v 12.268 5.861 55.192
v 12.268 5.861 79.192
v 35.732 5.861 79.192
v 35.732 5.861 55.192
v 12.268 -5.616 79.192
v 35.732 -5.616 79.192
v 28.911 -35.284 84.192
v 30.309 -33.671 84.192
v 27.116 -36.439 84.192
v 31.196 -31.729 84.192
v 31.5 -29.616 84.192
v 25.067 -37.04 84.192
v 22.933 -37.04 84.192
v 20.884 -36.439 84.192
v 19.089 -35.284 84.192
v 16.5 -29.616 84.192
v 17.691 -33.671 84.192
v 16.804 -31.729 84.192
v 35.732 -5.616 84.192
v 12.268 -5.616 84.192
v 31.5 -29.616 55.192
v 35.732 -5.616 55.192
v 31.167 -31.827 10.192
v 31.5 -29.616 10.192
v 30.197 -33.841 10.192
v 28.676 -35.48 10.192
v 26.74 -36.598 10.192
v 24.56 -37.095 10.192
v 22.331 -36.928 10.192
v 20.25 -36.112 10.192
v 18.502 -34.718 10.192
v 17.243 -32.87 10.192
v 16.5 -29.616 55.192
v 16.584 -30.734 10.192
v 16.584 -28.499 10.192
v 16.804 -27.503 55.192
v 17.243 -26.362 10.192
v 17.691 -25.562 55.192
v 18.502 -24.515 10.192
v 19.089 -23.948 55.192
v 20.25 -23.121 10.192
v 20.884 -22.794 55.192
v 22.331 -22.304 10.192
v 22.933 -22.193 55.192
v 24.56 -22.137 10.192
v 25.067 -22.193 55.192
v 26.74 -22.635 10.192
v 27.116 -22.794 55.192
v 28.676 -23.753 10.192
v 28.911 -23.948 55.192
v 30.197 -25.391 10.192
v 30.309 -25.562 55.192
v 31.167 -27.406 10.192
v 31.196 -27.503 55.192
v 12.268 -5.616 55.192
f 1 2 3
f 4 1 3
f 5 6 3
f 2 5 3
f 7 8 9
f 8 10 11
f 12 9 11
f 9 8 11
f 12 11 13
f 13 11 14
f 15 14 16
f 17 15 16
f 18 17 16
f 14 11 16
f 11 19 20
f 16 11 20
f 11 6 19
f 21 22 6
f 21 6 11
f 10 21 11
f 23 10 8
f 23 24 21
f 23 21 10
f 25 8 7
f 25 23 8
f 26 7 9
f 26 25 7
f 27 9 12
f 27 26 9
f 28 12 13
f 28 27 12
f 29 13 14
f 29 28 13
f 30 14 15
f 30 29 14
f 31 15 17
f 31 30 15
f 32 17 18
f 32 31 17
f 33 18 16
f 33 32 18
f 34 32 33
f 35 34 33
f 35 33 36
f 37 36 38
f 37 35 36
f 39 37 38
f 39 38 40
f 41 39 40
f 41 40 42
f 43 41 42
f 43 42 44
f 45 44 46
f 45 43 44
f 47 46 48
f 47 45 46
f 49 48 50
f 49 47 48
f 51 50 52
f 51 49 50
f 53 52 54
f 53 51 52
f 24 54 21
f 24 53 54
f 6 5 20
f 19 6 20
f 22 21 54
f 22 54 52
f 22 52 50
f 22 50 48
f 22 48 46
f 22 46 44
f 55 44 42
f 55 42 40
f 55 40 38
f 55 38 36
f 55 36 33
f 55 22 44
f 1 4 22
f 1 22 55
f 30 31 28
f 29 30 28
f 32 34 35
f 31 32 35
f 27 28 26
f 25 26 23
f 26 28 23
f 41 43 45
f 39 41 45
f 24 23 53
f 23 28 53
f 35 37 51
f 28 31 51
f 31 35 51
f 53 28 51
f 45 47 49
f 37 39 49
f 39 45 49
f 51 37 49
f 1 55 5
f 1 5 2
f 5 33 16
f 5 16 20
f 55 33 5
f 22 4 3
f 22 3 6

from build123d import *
from build123d.topology import SkipClean

# Parameters (mm, degrees)
SKETCH1_W               = 48
SKETCH1_H               = 53
BOSS_EXTRUDE1_DEPTH     = 10
SKETCH2_W               = 48
SKETCH2_H               = 5.616325
BOSS_EXTRUDE2_DEPTH     = 33.1917878
SKETCH4_W               = 4
SKETCH4_H               = 10
BOSS_EXTRUDE4_DEPTH     = 40
SKETCH5_W               = 48
SKETCH5_H               = 10.8609375
BOSS_EXTRUDE5_DEPTH     = 23.1917878
SKETCH6_W               = 48
SKETCH6_H               = 5
BOSS_EXTRUDE6_DEPTH     = 42.3
SKETCH7_W               = 12.8082122
SKETCH7_H               = 16.4772625
BOSS_EXTRUDE7_DEPTH     = 48
CUT_EXTRUDE1_REACH      = 84.426
SKETCH8_R               = 11.5
SKETCH8_R_2             = 2
FILLET1_R               = 10
FILLET2_R               = 4
SKETCH9_W               = 5
SKETCH9_H               = 16.4772625
BOSS_EXTRUDE9_DEPTH     = 48
CUT_EXTRUDE2_DEPTH      = 88.252507127
SKETCH11_W              = 51
SKETCH11_H              = 16.4772625
BOSS_EXTRUDE10_DEPTH    = 49.45
BOSS_EXTRUDE11_DEPTH    = 46
SKETCH16_W              = 47.95
SKETCH16_H              = 51
BOSS_EXTRUDE14_DEPTH    = 2.55
SKETCH14_W              = 5
SKETCH14_H              = 42.3
BOSS_EXTRUDE13_DEPTH    = 1.5
SKETCH17_W              = 51
SKETCH17_H              = 19.0272625
BOSS_EXTRUDE15_DEPTH    = 9
BOSS_EXTRUDE16_DEPTH    = 25
SKETCH19_R              = 1.9304
CUT_EXTRUDE3_DEPTH      = 125.404890183
MIRROR2_START           = 33.1917878
MIRROR2_DEPTH           = 51
MIRROR2_START_2         = 76.1917878
MIRROR2_2_OUTLINE_W     = 47.95
MIRROR2_2_OUTLINE_H     = 25
MIRROR2_2_OUTLINE_R     = 1.9304
MIRROR2_2_DEPTH         = 8
MIRROR2_3_OUTLINE_W     = 45
MIRROR2_3_OUTLINE_H     = 42.3
MIRROR2_3_OUTLINE_R     = 2
MIRROR2_3_OUTLINE_R_2   = 11.5
MIRROR2_3_DEPTH         = 5
SKETCH20_W              = 103.287975037
SKETCH20_H              = 97.84889924
CUT_EXTRUDE4_DEPTH      = 144.929961559
SKETCH21_W              = 49.5
SKETCH21_H              = 42.3
CUT_EXTRUDE5_DEPTH      = 128.391431036
SKETCH24_R              = 7.5
BOSS_EXTRUDE18_DEPTH    = 45
BOSS_EXTRUDE19_DEPTH    = 29
SKETCH26_R              = 3.937
CUT_EXTRUDE6_DEPTH      = 135.023808387
CUT_EXTRUDE7_DEPTH      = 133.174975247
CUT_EXTRUDE7_DEPTH_BACK = 133.174975247
SKETCH27_W              = 131.04651434
SKETCH27_H              = 69.942394415
SKETCH30_W              = 22
SKETCH30_H              = 11.4772625
SKETCH30_W_2            = 5
CUT_EXTRUDE10_DEPTH     = 95.954850856


# Read off the part's stored shape, not the designer's step: Mirror2
with BuildPart() as part:
    # Sketch1 → Boss-Extrude1 (new body)
    with BuildSketch(Plane.XY):
        with Locations((24, 26.5)):
            Rectangle(SKETCH1_W, SKETCH1_H)
    extrude(amount=BOSS_EXTRUDE1_DEPTH)

    # Sketch2 → Boss-Extrude2 (add)
    with BuildSketch(Plane(origin=(0, 0, 0), x_dir=(-1, 0, 0), z_dir=(0, 0, -1))):
        with Locations((-24, -2.8081625)):
            Rectangle(SKETCH2_W, SKETCH2_H)
    extrude(amount=-BOSS_EXTRUDE2_DEPTH)

    # Sketch4 → Boss-Extrude4 (add)
    with BuildSketch(Plane.XY.offset(10)):
        with Locations((2, 48)):
            Rectangle(SKETCH4_W, SKETCH4_H)
        with Locations((46, 48)):
            Rectangle(SKETCH4_W, SKETCH4_H)
    extrude(amount=BOSS_EXTRUDE4_DEPTH)

    # Sketch5 → Boss-Extrude5 (add)
    with BuildSketch(Plane.XY.offset(10)):
        with Locations((24, 5.43046875)):
            Rectangle(SKETCH5_W, SKETCH5_H)
    extrude(amount=BOSS_EXTRUDE5_DEPTH)

    # Sketch6 → Boss-Extrude6 (add)
    with BuildSketch(Plane.XZ.offset(5.616325)):
        with Locations((24, 30.6917878)):
            Rectangle(SKETCH6_W, SKETCH6_H)
    extrude(amount=BOSS_EXTRUDE6_DEPTH)

    # Sketch7 → Boss-Extrude7 (add)
    with BuildSketch(Plane.ZY):
        with Locations((-6.4041061, 2.62230625)):
            Rectangle(SKETCH7_W, SKETCH7_H)
    extrude(amount=-BOSS_EXTRUDE7_DEPTH)

    # Sketch8 → Cut-Extrude1 (cut, up to next)
    with BuildSketch(Plane(origin=(0, 0, 28.1917878), x_dir=(-1, 0, 0), z_dir=(0, 0, -1)), mode=Mode.PRIVATE) as cut_extrude1_sk1:
        with Locations((-24, -26.616325)):
            Circle(SKETCH8_R)
    cut_extrude1_tool1 = extrude(cut_extrude1_sk1.sketch, amount=-CUT_EXTRUDE1_REACH, mode=Mode.PRIVATE) & part.part
    # Sketch8 → Cut-Extrude1 (cut, up to next)
    with BuildSketch(Plane(origin=(0, 0, 28.1917878), x_dir=(-1, 0, 0), z_dir=(0, 0, -1)), mode=Mode.PRIVATE) as cut_extrude1_sk2:
        with Locations((-39.5, -11.116325)):
            Circle(SKETCH8_R_2)
    cut_extrude1_tool2 = extrude(cut_extrude1_sk2.sketch, amount=-CUT_EXTRUDE1_REACH, mode=Mode.PRIVATE) & part.part
    # Sketch8 → Cut-Extrude1 (cut, up to next)
    with BuildSketch(Plane(origin=(0, 0, 28.1917878), x_dir=(-1, 0, 0), z_dir=(0, 0, -1)), mode=Mode.PRIVATE) as cut_extrude1_sk3:
        with Locations((-39.5, -42.116325)):
            Circle(SKETCH8_R_2)
    cut_extrude1_tool3 = extrude(cut_extrude1_sk3.sketch, amount=-CUT_EXTRUDE1_REACH, mode=Mode.PRIVATE) & part.part
    # Sketch8 → Cut-Extrude1 (cut, up to next)
    with BuildSketch(Plane(origin=(0, 0, 28.1917878), x_dir=(-1, 0, 0), z_dir=(0, 0, -1)), mode=Mode.PRIVATE) as cut_extrude1_sk4:
        with Locations((-8.5, -11.116325)):
            Circle(SKETCH8_R_2)
    cut_extrude1_tool4 = extrude(cut_extrude1_sk4.sketch, amount=-CUT_EXTRUDE1_REACH, mode=Mode.PRIVATE) & part.part
    # Sketch8 → Cut-Extrude1 (cut, up to next)
    with BuildSketch(Plane(origin=(0, 0, 28.1917878), x_dir=(-1, 0, 0), z_dir=(0, 0, -1)), mode=Mode.PRIVATE) as cut_extrude1_sk5:
        with Locations((-8.5, -42.116325)):
            Circle(SKETCH8_R_2)
    cut_extrude1_tool5 = extrude(cut_extrude1_sk5.sketch, amount=-CUT_EXTRUDE1_REACH, mode=Mode.PRIVATE) & part.part
    add(cut_extrude1_tool1.solids().sort_by_distance((24, -26.616325, 28.191788))[0], mode=Mode.SUBTRACT)
    add(cut_extrude1_tool2.solids().sort_by_distance((39.5, -11.116325, 28.191788))[0], mode=Mode.SUBTRACT)
    add(cut_extrude1_tool3.solids().sort_by_distance((39.5, -42.116325, 28.191788))[0], mode=Mode.SUBTRACT)
    add(cut_extrude1_tool4.solids().sort_by_distance((8.5, -11.116325, 28.191788))[0], mode=Mode.SUBTRACT)
    add(cut_extrude1_tool5.solids().sort_by_distance((8.5, -42.116325, 28.191788))[0], mode=Mode.SUBTRACT)

    # Fillet1
    fillet1_edges = [part.edges().sort_by_distance(p)[0] for p in [
        (24, 10.8609375, 0),
    ]]
    fillet(fillet1_edges, radius=FILLET1_R)

    # Fillet2
    fillet2_edges = [part.edges().sort_by_distance(p)[0] for p in [
        (2, 43, 10),
        (46, 43, 10),
    ]]
    fillet(fillet2_edges, radius=FILLET2_R)

    # Sketch9 → Boss-Extrude9 (add)
    with BuildSketch(Plane(origin=(48, 0, 0), x_dir=(0, 0, -1), z_dir=(1, 0, 0))):
        with Locations((15.3082122, 2.62230625)):
            Rectangle(SKETCH9_W, SKETCH9_H)
    extrude(amount=-BOSS_EXTRUDE9_DEPTH)

    # Sketch10 → Cut-Extrude2 (cut, through all)
    with BuildSketch(Plane(origin=(48, 0, 0), x_dir=(0, 0, -1), z_dir=(1, 0, 0))):
        Polygon((17.8082122, 10.8609375), (-33.1917878, 10.8609375), (-76.887145623, 43.902095521), (-50.794096938, 74.436514195), (27.207463492, 71.105486703), align=None)
    extrude(amount=-CUT_EXTRUDE2_DEPTH, mode=Mode.SUBTRACT)

    # Sketch11 → Boss-Extrude10 (add)
    with BuildSketch(Plane(origin=(48, 0, 0), x_dir=(0, 0, -1), z_dir=(1, 0, 0))):
        with Locations((-7.6917878, 2.62230625)):
            Rectangle(SKETCH11_W, SKETCH11_H)
    extrude(amount=BOSS_EXTRUDE10_DEPTH)

    # Sketch12 → Boss-Extrude11 (add)
    with BuildSketch(Plane(origin=(0, 0, 28.1917878), x_dir=(-1, 0, 0), z_dir=(0, 0, -1))):
        Polygon((-48, -47.916325), (-45, -47.916325), (-45, -5.616325), (-49.5, -5.616325), (-49.5, -47.916325), align=None)
    extrude(amount=BOSS_EXTRUDE11_DEPTH)

    # Sketch16 → Boss-Extrude14 (add)
    with BuildSketch(Plane.XZ.offset(5.616325)):
        with Locations((73.475, 7.6917878)):
            Rectangle(SKETCH16_W, SKETCH16_H)
    extrude(amount=BOSS_EXTRUDE14_DEPTH)

    # Sketch14 → Boss-Extrude13 (add)
    with BuildSketch(Plane(origin=(49.5, 0, 0), x_dir=(0, 0, -1), z_dir=(1, 0, 0))):
        with Locations((-30.6917878, -26.766325)):
            Rectangle(SKETCH14_W, SKETCH14_H)
    extrude(amount=-BOSS_EXTRUDE13_DEPTH)

    # Sketch17 → Boss-Extrude15 (add)
    with BuildSketch(Plane(origin=(97.45, 0, 0), x_dir=(0, 0, -1), z_dir=(1, 0, 0))):
        with Locations((-7.6917878, 1.34730625)):
            Rectangle(SKETCH17_W, SKETCH17_H)
    extrude(amount=BOSS_EXTRUDE15_DEPTH)

    # Sketch18 → Boss-Extrude16 (add)
    with BuildSketch(Plane.XZ.offset(8.166325)):
        Polygon((49.5, -17.8082122), (106.45, -17.8082122), (106.45, -9.8082122), (106.45, 33.1917878), (97.45, 33.1917878), (97.45, -9.8082122), (49.5, -9.8082122), align=None)
    extrude(amount=BOSS_EXTRUDE16_DEPTH)

    # Sketch19 → Cut-Extrude3 (cut, through all)
    with BuildSketch(Plane.XY.offset(-9.8082122)):
        with Locations((58.475, -26.166325)):
            Circle(SKETCH19_R)
        with Locations((88.475, -26.166325)):
            Circle(SKETCH19_R)
    extrude(amount=-CUT_EXTRUDE3_DEPTH, mode=Mode.SUBTRACT)

    # Mirror2 outline → Mirror2 (add)
    with BuildSketch(Plane.XY.offset(MIRROR2_START)):
        Polygon((49.5, -47.916325), (49.5, -8.166325), (97.45, -8.166325), (97.45, -33.166325), (106.45, -33.166325), (106.45, 10.8609375), (0, 10.8609375), (0, -5.616325), (45, -5.616325), (45, -47.916325), align=None)
    extrude(amount=MIRROR2_DEPTH)

    # Mirror2 2 outline → Mirror2 2 (add)
    with BuildSketch(Plane.XY.offset(MIRROR2_START_2)):
        with Locations((73.475, -20.666325)):
            Rectangle(MIRROR2_2_OUTLINE_W, MIRROR2_2_OUTLINE_H)
        with Locations((58.475, -26.166325)):
            Circle(MIRROR2_2_OUTLINE_R, mode=Mode.SUBTRACT)
        with Locations((88.475, -26.166325)):
            Circle(MIRROR2_2_OUTLINE_R, mode=Mode.SUBTRACT)
    extrude(amount=MIRROR2_2_DEPTH)

    # Mirror2 3 outline → Mirror2 3 (add)
    with SkipClean():  # the faces are left unmerged after this step: merging them gives an invalid solid
        with BuildSketch(Plane.XY.offset(MIRROR2_START)):
            with Locations((22.5, -26.766325)):
                Rectangle(MIRROR2_3_OUTLINE_W, MIRROR2_3_OUTLINE_H)
            with Locations((8.5, -42.116325)):
                Circle(MIRROR2_3_OUTLINE_R, mode=Mode.SUBTRACT)
            with Locations((39.5, -42.116325)):
                Circle(MIRROR2_3_OUTLINE_R, mode=Mode.SUBTRACT)
            with Locations((24, -26.616325)):
                Circle(MIRROR2_3_OUTLINE_R_2, mode=Mode.SUBTRACT)
            with Locations((8.5, -11.116325)):
                Circle(MIRROR2_3_OUTLINE_R, mode=Mode.SUBTRACT)
            with Locations((39.5, -11.116325)):
                Circle(MIRROR2_3_OUTLINE_R, mode=Mode.SUBTRACT)
        extrude(amount=MIRROR2_3_DEPTH)

    # Sketch20 → Cut-Extrude4 (cut, through all)
    with BuildSketch(Plane.ZY):
        with Locations((-18.452199719, -38.06351212)):
            Rectangle(SKETCH20_W, SKETCH20_H)
    extrude(amount=-CUT_EXTRUDE4_DEPTH, mode=Mode.SUBTRACT)

    # Sketch21 → Cut-Extrude5 (cut, through all)
    with BuildSketch(Plane.XY.offset(84.1917878)):
        with Locations((24.75, -26.766325)):
            Rectangle(SKETCH21_W, SKETCH21_H)
    extrude(amount=-CUT_EXTRUDE5_DEPTH, mode=Mode.SUBTRACT)



with BuildPart() as body_2:
    # Sketch24 → Boss-Extrude18 (new body)
    with BuildSketch(Plane.XY.offset(55.1917878)):
        with Locations((24, -29.616325)):
            Circle(SKETCH24_R)
    extrude(amount=-BOSS_EXTRUDE18_DEPTH)


with BuildPart() as part_1:
    add(part.part)

    add(body_2.part)  # Boss-Extrude19 merges body 2
    # Sketch25 → Boss-Extrude19 (add)
    with BuildSketch(Plane.XY.offset(55.1917878)):
        with BuildLine():
            Line((16.5, -29.616325), (12.268152463, -5.616325))
            Line((12.268152463, -5.616325), (35.731847537, -5.616325))
            Line((35.731847537, -5.616325), (31.5, -29.616325))
            ThreePointArc((31.5, -29.616325), (24, -37.116325), (16.5, -29.616325))
        make_face()
    extrude(amount=BOSS_EXTRUDE19_DEPTH)

    # Sketch26 → Cut-Extrude6 (cut, through all)
    with BuildSketch(Plane.ZY.offset(-97.45)):
        with Locations((59.1917878, -16.166325)):
            Circle(SKETCH26_R)
    extrude(amount=-CUT_EXTRUDE6_DEPTH, mode=Mode.SUBTRACT)

    # Sketch27 → Cut-Extrude7 (cut, two sides: drawn at the far end of the back side and taken through both)
    with BuildSketch(Plane.XY.offset(79.1917878).offset(-CUT_EXTRUDE7_DEPTH_BACK)):
        with Locations((52.297526751, -17.773339354)):
            Rectangle(SKETCH27_W, SKETCH27_H)
        Polygon((12.268152463, -5.616325), (12.268152463, 5.8609375), (35.731847537, 5.8609375), (35.731847537, -5.616325), (35.731847537, -46.734959709), (12.268152463, -46.734959709), align=None, mode=Mode.SUBTRACT)
    extrude(amount=CUT_EXTRUDE7_DEPTH + CUT_EXTRUDE7_DEPTH_BACK, mode=Mode.SUBTRACT)

    # Sketch30 → Cut-Extrude10 (cut, through all)
    with BuildSketch(Plane.ZY.offset(-12.268152463)):
        with Locations((44.1917878, 0.12230625)):
            Rectangle(SKETCH30_W, SKETCH30_H)
        with Locations((81.6917878, 0.12230625)):
            Rectangle(SKETCH30_W_2, SKETCH30_H)
    extrude(amount=-CUT_EXTRUDE10_DEPTH, mode=Mode.SUBTRACT)


solid = part_1.part
